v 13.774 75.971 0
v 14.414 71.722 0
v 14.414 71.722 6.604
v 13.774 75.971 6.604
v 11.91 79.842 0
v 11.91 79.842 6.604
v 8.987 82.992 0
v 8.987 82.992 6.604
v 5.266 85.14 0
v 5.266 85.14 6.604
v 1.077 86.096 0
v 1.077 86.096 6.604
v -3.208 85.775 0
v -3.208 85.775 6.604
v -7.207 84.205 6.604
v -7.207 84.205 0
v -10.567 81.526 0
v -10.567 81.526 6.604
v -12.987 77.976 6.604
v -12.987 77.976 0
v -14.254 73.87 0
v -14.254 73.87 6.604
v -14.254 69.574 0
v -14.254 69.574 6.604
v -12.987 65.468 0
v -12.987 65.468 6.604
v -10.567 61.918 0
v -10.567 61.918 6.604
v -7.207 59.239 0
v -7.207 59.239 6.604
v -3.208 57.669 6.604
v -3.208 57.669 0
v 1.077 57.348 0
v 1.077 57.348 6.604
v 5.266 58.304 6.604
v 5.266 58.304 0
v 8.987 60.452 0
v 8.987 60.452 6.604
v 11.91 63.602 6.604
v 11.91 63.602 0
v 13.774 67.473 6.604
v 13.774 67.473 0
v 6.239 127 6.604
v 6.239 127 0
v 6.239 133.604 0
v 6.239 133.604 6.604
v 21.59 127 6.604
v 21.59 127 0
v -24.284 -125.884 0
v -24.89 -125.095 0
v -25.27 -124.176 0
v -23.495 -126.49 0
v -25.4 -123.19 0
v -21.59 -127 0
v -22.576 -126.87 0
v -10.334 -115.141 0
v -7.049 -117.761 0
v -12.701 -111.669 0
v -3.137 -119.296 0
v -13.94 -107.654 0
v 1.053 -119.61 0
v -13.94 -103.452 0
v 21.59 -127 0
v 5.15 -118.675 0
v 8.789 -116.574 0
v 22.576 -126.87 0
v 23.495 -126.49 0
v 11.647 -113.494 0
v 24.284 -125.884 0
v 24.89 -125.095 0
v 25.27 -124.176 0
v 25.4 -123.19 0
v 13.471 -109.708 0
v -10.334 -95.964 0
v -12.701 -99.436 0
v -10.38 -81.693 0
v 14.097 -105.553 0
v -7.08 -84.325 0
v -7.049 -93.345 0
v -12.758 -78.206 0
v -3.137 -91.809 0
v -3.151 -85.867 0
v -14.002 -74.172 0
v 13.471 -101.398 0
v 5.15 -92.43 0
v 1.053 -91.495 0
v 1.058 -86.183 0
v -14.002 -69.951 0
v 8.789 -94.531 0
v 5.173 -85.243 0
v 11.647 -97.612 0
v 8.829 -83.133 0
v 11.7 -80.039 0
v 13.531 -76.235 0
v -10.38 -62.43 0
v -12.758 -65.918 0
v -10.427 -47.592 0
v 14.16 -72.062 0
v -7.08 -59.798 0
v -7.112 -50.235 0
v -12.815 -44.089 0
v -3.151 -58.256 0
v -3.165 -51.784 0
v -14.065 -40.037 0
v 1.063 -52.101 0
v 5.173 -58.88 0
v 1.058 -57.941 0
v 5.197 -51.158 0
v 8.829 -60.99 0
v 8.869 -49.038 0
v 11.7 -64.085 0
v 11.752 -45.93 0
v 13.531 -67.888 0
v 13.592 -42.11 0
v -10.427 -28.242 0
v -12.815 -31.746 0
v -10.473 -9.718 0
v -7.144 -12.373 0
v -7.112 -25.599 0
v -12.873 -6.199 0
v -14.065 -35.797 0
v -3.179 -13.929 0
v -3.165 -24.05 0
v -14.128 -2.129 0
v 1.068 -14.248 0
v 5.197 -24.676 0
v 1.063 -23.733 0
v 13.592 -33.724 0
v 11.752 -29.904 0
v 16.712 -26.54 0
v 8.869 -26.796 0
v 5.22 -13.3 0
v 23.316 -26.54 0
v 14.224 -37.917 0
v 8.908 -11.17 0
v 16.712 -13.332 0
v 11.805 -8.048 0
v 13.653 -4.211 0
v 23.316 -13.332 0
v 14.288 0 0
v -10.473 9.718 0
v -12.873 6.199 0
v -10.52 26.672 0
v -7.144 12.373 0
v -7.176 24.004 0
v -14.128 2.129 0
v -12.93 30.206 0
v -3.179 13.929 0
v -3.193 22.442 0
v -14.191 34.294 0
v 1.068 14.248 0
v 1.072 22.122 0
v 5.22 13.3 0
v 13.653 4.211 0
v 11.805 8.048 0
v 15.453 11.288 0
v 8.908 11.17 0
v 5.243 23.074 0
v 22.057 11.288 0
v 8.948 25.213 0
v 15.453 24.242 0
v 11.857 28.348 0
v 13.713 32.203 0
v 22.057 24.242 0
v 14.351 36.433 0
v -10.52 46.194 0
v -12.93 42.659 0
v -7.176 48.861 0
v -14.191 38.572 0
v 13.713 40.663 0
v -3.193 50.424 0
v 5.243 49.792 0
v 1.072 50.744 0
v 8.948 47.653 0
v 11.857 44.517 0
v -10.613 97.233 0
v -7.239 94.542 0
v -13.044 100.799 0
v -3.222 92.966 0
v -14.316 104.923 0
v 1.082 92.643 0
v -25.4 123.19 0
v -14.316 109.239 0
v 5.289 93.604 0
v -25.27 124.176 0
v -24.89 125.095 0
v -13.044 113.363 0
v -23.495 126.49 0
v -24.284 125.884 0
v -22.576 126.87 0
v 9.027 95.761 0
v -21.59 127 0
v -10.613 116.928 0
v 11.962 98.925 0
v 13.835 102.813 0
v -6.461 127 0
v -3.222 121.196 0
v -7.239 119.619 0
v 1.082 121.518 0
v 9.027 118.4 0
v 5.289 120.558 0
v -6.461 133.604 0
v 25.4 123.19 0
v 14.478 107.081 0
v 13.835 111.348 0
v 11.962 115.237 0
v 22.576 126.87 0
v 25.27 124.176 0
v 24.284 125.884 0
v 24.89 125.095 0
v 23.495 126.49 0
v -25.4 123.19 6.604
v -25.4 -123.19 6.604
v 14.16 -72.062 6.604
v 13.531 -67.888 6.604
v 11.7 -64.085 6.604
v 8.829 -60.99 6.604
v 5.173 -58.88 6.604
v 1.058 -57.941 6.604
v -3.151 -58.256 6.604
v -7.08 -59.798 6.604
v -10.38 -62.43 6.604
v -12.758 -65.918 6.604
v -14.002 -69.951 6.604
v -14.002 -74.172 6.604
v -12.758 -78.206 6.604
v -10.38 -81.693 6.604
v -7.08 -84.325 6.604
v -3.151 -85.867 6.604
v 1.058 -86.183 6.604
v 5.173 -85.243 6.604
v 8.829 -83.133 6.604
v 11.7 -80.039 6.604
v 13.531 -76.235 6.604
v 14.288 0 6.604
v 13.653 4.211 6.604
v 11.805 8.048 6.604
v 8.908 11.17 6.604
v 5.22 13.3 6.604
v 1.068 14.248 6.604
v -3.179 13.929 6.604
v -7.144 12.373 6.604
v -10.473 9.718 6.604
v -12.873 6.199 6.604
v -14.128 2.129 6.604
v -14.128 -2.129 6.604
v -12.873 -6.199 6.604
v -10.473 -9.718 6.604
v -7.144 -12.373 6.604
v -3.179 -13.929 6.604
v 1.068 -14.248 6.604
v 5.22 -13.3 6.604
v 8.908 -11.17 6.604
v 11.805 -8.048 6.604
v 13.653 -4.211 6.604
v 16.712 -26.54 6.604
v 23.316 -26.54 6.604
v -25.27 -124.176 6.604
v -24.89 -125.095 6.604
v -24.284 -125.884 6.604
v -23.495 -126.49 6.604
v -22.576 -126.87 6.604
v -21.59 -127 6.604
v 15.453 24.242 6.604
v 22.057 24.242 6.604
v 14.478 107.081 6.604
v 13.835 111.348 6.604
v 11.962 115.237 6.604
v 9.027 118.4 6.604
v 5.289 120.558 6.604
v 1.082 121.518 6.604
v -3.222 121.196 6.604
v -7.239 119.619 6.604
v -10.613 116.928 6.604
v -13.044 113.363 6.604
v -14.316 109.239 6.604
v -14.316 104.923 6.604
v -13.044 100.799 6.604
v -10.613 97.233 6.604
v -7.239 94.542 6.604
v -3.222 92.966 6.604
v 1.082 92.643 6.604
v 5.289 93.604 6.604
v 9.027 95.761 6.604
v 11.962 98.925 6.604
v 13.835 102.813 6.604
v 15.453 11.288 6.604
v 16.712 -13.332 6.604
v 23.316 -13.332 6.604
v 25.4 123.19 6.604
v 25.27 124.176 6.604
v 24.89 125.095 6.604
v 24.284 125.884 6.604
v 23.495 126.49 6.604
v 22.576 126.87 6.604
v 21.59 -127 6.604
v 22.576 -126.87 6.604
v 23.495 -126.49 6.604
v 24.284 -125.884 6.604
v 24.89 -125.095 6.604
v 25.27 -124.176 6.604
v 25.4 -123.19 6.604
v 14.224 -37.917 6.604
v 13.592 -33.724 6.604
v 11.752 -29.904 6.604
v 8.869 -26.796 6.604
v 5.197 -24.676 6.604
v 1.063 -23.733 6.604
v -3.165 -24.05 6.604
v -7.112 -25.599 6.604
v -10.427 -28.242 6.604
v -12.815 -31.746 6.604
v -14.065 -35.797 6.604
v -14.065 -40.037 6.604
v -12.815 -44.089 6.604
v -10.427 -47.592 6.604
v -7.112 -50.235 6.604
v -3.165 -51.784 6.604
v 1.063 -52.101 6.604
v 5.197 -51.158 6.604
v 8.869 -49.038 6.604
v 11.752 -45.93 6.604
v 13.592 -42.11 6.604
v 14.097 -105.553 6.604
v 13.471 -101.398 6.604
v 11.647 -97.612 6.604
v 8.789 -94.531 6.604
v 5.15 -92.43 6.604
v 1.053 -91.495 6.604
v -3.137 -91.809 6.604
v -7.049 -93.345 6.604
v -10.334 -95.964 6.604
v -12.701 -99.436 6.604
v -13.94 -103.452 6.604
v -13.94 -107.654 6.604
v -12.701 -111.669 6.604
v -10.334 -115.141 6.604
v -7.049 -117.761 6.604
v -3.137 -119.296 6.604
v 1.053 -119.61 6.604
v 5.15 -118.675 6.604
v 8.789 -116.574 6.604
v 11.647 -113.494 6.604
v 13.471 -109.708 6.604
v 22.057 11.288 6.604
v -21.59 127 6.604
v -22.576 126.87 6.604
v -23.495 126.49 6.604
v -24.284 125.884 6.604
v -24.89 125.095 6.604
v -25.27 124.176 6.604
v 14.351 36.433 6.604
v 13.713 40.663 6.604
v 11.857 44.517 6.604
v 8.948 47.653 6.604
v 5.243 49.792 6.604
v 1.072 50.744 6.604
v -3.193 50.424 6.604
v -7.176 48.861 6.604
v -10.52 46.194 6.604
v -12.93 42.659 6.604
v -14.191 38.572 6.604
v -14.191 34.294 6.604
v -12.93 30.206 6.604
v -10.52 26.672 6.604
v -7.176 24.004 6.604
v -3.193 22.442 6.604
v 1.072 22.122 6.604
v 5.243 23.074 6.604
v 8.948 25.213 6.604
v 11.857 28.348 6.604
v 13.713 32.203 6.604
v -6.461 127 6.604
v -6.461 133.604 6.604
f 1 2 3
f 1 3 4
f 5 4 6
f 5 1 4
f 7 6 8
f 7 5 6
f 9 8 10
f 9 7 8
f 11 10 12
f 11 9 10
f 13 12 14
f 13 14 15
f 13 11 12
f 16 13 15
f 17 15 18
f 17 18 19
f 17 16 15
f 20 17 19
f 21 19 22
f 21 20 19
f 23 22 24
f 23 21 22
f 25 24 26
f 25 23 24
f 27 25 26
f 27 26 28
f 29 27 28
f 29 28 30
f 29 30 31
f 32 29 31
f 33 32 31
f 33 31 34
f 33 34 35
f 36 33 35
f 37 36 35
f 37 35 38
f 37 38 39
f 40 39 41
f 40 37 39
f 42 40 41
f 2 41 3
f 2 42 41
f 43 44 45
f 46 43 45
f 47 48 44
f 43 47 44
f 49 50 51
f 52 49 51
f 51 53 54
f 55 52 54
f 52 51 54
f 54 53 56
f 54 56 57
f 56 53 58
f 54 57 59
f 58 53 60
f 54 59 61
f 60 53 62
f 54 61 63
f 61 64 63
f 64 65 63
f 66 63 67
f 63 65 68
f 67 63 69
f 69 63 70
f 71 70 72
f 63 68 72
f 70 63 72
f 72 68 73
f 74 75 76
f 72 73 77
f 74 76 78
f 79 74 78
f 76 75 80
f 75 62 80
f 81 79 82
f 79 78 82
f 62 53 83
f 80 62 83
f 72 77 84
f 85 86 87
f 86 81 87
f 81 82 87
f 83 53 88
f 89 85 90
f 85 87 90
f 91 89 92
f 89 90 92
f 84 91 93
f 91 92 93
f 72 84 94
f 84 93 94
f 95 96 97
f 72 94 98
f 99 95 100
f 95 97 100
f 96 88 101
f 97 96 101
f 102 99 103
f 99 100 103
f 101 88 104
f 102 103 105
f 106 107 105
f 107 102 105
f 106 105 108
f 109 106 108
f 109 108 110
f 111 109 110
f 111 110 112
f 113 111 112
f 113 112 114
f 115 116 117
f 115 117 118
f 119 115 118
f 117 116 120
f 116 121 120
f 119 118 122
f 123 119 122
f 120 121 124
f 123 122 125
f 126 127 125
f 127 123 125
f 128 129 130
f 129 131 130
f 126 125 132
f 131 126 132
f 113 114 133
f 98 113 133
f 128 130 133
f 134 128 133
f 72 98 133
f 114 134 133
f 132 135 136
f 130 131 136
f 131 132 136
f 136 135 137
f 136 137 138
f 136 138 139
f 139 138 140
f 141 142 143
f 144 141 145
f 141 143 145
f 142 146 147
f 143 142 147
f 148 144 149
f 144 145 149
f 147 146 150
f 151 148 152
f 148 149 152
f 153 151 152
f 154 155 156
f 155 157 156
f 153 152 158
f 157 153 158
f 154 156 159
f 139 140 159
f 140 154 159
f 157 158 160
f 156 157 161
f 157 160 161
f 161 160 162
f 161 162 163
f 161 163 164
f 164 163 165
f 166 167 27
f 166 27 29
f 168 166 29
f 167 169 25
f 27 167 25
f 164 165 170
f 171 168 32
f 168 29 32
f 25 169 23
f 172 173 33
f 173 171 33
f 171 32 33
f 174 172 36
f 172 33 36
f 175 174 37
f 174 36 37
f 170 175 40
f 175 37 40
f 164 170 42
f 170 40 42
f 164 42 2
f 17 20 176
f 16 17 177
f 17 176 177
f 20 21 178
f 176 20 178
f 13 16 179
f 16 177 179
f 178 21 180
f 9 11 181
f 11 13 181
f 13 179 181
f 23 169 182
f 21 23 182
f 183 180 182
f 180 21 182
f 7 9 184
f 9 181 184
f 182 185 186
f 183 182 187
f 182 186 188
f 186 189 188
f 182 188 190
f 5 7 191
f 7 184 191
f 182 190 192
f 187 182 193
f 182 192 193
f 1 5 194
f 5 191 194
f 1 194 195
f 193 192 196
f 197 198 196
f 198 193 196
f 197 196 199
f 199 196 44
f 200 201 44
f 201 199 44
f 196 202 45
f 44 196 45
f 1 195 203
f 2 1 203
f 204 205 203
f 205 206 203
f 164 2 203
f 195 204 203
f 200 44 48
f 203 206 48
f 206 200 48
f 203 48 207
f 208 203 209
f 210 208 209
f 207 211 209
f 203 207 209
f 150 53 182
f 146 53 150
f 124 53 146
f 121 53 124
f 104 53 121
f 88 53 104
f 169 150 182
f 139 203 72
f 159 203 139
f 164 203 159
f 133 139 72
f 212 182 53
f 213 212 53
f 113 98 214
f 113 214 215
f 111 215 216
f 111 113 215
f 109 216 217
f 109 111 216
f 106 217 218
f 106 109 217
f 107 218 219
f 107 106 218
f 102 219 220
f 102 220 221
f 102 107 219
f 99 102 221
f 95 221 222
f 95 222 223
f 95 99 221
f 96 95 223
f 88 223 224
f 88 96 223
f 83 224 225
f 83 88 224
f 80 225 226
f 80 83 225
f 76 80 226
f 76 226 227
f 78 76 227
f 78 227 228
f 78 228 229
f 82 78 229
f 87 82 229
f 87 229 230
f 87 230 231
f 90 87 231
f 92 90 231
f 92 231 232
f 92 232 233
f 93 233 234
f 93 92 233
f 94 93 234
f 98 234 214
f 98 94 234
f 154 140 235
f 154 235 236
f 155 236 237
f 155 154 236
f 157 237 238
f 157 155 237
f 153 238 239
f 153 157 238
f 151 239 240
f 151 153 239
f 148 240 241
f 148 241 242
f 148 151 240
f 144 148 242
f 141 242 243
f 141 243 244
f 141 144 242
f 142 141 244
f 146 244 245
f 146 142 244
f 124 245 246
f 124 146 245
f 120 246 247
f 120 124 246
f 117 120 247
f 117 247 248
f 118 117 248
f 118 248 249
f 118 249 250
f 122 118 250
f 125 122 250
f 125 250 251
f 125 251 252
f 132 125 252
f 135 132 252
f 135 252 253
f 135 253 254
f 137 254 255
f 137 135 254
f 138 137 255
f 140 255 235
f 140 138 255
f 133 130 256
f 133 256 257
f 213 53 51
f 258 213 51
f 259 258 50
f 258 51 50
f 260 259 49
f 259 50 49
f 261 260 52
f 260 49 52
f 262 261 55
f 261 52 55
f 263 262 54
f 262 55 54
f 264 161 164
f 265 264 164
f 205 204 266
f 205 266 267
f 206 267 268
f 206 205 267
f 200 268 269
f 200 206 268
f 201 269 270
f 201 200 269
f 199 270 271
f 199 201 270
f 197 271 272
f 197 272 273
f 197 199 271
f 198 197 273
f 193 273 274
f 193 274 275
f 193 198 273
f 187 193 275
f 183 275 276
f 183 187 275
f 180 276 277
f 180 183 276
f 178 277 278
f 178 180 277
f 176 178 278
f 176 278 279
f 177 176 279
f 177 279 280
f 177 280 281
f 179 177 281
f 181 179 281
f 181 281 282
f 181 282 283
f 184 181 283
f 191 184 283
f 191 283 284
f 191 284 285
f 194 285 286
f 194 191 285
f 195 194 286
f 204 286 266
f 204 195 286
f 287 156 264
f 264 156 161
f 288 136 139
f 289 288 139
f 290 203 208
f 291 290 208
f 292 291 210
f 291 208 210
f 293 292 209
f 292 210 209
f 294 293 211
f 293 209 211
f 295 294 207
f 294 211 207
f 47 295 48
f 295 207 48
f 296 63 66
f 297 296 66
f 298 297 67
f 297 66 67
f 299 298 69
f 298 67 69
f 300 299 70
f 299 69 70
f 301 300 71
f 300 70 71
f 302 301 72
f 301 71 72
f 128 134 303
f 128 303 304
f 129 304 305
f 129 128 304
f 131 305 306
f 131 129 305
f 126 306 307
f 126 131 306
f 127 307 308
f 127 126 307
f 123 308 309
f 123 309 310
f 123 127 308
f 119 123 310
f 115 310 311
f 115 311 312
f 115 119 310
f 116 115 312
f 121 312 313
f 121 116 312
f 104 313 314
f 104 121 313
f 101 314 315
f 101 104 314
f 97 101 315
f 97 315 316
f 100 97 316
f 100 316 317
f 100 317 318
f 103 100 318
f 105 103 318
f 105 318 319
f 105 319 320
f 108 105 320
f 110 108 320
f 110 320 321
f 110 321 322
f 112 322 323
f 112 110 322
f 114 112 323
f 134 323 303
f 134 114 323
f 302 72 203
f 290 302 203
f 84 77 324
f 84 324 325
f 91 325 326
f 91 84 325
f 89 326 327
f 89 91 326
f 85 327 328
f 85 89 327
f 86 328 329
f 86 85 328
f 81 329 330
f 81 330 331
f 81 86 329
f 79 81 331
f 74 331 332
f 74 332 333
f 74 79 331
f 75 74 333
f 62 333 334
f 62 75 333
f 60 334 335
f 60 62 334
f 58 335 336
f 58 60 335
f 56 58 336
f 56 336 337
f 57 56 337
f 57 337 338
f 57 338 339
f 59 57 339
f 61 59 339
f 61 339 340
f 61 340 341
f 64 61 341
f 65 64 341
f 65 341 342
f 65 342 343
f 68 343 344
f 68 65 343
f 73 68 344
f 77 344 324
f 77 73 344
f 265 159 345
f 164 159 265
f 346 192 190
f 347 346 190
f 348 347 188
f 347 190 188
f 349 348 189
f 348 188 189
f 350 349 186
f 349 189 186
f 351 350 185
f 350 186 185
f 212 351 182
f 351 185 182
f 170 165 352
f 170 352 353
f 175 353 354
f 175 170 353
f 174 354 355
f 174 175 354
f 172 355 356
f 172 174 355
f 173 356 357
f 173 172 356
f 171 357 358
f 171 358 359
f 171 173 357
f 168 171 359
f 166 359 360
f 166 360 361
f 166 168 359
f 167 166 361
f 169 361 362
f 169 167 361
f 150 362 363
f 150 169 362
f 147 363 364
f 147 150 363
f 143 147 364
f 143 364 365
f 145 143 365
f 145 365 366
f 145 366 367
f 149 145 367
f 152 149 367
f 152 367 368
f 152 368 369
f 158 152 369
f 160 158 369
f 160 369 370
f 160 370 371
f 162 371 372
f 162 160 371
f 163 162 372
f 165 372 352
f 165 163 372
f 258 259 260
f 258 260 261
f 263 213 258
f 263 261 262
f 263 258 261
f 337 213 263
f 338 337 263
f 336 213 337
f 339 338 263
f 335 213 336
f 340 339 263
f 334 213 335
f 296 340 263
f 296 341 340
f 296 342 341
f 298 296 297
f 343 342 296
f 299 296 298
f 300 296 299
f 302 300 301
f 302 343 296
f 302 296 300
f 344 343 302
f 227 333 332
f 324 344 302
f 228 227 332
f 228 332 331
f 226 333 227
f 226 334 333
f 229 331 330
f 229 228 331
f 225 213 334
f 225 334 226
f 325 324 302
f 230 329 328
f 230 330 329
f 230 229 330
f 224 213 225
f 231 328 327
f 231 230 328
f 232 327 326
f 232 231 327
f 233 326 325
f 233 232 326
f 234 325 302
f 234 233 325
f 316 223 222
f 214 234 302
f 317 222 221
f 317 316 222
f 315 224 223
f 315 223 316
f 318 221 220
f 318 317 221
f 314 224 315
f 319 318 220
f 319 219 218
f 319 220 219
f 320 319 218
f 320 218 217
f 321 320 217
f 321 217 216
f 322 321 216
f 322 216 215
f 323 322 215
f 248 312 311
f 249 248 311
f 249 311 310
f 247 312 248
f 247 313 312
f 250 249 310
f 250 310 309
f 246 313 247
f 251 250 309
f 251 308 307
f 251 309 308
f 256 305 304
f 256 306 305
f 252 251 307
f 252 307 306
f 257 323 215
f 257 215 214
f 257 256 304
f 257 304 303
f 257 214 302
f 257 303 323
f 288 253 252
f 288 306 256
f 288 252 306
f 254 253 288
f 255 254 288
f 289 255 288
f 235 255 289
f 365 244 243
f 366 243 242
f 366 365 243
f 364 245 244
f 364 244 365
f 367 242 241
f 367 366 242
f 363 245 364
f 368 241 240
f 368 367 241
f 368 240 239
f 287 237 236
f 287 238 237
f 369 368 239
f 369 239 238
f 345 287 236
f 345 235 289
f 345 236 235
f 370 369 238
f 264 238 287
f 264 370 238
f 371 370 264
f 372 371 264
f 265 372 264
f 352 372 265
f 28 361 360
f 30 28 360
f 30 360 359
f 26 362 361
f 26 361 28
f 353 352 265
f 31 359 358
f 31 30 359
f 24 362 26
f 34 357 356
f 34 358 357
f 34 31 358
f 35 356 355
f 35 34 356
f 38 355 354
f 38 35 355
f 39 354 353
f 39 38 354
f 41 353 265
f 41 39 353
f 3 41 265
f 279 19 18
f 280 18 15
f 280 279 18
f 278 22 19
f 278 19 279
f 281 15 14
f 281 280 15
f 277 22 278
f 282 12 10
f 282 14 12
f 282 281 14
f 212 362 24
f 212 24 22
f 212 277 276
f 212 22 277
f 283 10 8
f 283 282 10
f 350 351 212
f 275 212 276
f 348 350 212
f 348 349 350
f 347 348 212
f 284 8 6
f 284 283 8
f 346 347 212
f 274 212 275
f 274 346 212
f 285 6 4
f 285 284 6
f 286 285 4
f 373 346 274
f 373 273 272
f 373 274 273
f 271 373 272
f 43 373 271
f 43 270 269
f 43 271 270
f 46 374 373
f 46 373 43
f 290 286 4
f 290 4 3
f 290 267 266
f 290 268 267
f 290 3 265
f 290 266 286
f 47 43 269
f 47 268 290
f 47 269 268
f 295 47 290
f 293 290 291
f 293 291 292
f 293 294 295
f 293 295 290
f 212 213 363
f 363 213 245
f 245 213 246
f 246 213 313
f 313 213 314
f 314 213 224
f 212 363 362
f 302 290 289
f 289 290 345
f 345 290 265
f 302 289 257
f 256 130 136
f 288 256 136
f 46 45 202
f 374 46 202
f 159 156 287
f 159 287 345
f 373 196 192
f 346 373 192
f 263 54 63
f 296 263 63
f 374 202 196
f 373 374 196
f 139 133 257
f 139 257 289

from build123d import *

# Parameters (mm, degrees)
F0_R     = 14.097
F0_R_2   = 14.1605
F0_R_3   = 14.224
F0_R_4   = 14.2875
F0_W     = 6.604
F0_H     = 13.208
F0_R_5   = 14.351
F0_H_2   = 12.954
F0_R_6   = 14.4145
F0_R_7   = 14.478
F1_DEPTH = 6.604


with BuildPart() as f1:
    # F0 (on Top) → F1 (new body)
    with BuildSketch(Plane.XY):
        with BuildLine():
            ThreePointArc((25.4, 123.19), (24.284077, 125.884077), (21.59, 127))
            Line((21.59, 127), (6.239323, 127))
            Line((6.239323, 127), (6.239323, 133.604))
            Line((6.239323, 133.604), (-6.460677, 133.604))
            Line((-6.460677, 133.604), (-6.460677, 127))
            Line((-6.460677, 127), (-21.59, 127))
            ThreePointArc((-21.59, 127), (-24.284077, 125.884077), (-25.4, 123.19))
            Line((-25.4, 123.19), (-25.4, -123.19))
            ThreePointArc((-25.4, -123.19), (-24.284077, -125.884077), (-21.59, -127))
            Line((-21.59, -127), (21.59, -127))
            ThreePointArc((21.59, -127), (24.284077, -125.884077), (25.4, -123.19))
            Line((25.4, -123.19), (25.4, 123.19))
        make_face()
        with Locations((0, -105.552882)):
            Circle(F0_R, mode=Mode.SUBTRACT)
        with Locations((0, -72.061613)):
            Circle(F0_R_2, mode=Mode.SUBTRACT)
        with Locations((0, -37.917089)):
            Circle(F0_R_3, mode=Mode.SUBTRACT)
        Circle(F0_R_4, mode=Mode.SUBTRACT)
        with Locations((20.013824, -19.935825)):
            Rectangle(F0_W, F0_H, mode=Mode.SUBTRACT)
        with Locations((0, 36.432702)):
            Circle(F0_R_5, mode=Mode.SUBTRACT)
        with Locations((18.755223, 17.765409)):
            Rectangle(F0_W, F0_H_2, mode=Mode.SUBTRACT)
        with Locations((0, 71.722105)):
            Circle(F0_R_6, mode=Mode.SUBTRACT)
        with Locations((0, 107.080773)):
            Circle(F0_R_7, mode=Mode.SUBTRACT)
    extrude(amount=F1_DEPTH)


solid = f1.part
